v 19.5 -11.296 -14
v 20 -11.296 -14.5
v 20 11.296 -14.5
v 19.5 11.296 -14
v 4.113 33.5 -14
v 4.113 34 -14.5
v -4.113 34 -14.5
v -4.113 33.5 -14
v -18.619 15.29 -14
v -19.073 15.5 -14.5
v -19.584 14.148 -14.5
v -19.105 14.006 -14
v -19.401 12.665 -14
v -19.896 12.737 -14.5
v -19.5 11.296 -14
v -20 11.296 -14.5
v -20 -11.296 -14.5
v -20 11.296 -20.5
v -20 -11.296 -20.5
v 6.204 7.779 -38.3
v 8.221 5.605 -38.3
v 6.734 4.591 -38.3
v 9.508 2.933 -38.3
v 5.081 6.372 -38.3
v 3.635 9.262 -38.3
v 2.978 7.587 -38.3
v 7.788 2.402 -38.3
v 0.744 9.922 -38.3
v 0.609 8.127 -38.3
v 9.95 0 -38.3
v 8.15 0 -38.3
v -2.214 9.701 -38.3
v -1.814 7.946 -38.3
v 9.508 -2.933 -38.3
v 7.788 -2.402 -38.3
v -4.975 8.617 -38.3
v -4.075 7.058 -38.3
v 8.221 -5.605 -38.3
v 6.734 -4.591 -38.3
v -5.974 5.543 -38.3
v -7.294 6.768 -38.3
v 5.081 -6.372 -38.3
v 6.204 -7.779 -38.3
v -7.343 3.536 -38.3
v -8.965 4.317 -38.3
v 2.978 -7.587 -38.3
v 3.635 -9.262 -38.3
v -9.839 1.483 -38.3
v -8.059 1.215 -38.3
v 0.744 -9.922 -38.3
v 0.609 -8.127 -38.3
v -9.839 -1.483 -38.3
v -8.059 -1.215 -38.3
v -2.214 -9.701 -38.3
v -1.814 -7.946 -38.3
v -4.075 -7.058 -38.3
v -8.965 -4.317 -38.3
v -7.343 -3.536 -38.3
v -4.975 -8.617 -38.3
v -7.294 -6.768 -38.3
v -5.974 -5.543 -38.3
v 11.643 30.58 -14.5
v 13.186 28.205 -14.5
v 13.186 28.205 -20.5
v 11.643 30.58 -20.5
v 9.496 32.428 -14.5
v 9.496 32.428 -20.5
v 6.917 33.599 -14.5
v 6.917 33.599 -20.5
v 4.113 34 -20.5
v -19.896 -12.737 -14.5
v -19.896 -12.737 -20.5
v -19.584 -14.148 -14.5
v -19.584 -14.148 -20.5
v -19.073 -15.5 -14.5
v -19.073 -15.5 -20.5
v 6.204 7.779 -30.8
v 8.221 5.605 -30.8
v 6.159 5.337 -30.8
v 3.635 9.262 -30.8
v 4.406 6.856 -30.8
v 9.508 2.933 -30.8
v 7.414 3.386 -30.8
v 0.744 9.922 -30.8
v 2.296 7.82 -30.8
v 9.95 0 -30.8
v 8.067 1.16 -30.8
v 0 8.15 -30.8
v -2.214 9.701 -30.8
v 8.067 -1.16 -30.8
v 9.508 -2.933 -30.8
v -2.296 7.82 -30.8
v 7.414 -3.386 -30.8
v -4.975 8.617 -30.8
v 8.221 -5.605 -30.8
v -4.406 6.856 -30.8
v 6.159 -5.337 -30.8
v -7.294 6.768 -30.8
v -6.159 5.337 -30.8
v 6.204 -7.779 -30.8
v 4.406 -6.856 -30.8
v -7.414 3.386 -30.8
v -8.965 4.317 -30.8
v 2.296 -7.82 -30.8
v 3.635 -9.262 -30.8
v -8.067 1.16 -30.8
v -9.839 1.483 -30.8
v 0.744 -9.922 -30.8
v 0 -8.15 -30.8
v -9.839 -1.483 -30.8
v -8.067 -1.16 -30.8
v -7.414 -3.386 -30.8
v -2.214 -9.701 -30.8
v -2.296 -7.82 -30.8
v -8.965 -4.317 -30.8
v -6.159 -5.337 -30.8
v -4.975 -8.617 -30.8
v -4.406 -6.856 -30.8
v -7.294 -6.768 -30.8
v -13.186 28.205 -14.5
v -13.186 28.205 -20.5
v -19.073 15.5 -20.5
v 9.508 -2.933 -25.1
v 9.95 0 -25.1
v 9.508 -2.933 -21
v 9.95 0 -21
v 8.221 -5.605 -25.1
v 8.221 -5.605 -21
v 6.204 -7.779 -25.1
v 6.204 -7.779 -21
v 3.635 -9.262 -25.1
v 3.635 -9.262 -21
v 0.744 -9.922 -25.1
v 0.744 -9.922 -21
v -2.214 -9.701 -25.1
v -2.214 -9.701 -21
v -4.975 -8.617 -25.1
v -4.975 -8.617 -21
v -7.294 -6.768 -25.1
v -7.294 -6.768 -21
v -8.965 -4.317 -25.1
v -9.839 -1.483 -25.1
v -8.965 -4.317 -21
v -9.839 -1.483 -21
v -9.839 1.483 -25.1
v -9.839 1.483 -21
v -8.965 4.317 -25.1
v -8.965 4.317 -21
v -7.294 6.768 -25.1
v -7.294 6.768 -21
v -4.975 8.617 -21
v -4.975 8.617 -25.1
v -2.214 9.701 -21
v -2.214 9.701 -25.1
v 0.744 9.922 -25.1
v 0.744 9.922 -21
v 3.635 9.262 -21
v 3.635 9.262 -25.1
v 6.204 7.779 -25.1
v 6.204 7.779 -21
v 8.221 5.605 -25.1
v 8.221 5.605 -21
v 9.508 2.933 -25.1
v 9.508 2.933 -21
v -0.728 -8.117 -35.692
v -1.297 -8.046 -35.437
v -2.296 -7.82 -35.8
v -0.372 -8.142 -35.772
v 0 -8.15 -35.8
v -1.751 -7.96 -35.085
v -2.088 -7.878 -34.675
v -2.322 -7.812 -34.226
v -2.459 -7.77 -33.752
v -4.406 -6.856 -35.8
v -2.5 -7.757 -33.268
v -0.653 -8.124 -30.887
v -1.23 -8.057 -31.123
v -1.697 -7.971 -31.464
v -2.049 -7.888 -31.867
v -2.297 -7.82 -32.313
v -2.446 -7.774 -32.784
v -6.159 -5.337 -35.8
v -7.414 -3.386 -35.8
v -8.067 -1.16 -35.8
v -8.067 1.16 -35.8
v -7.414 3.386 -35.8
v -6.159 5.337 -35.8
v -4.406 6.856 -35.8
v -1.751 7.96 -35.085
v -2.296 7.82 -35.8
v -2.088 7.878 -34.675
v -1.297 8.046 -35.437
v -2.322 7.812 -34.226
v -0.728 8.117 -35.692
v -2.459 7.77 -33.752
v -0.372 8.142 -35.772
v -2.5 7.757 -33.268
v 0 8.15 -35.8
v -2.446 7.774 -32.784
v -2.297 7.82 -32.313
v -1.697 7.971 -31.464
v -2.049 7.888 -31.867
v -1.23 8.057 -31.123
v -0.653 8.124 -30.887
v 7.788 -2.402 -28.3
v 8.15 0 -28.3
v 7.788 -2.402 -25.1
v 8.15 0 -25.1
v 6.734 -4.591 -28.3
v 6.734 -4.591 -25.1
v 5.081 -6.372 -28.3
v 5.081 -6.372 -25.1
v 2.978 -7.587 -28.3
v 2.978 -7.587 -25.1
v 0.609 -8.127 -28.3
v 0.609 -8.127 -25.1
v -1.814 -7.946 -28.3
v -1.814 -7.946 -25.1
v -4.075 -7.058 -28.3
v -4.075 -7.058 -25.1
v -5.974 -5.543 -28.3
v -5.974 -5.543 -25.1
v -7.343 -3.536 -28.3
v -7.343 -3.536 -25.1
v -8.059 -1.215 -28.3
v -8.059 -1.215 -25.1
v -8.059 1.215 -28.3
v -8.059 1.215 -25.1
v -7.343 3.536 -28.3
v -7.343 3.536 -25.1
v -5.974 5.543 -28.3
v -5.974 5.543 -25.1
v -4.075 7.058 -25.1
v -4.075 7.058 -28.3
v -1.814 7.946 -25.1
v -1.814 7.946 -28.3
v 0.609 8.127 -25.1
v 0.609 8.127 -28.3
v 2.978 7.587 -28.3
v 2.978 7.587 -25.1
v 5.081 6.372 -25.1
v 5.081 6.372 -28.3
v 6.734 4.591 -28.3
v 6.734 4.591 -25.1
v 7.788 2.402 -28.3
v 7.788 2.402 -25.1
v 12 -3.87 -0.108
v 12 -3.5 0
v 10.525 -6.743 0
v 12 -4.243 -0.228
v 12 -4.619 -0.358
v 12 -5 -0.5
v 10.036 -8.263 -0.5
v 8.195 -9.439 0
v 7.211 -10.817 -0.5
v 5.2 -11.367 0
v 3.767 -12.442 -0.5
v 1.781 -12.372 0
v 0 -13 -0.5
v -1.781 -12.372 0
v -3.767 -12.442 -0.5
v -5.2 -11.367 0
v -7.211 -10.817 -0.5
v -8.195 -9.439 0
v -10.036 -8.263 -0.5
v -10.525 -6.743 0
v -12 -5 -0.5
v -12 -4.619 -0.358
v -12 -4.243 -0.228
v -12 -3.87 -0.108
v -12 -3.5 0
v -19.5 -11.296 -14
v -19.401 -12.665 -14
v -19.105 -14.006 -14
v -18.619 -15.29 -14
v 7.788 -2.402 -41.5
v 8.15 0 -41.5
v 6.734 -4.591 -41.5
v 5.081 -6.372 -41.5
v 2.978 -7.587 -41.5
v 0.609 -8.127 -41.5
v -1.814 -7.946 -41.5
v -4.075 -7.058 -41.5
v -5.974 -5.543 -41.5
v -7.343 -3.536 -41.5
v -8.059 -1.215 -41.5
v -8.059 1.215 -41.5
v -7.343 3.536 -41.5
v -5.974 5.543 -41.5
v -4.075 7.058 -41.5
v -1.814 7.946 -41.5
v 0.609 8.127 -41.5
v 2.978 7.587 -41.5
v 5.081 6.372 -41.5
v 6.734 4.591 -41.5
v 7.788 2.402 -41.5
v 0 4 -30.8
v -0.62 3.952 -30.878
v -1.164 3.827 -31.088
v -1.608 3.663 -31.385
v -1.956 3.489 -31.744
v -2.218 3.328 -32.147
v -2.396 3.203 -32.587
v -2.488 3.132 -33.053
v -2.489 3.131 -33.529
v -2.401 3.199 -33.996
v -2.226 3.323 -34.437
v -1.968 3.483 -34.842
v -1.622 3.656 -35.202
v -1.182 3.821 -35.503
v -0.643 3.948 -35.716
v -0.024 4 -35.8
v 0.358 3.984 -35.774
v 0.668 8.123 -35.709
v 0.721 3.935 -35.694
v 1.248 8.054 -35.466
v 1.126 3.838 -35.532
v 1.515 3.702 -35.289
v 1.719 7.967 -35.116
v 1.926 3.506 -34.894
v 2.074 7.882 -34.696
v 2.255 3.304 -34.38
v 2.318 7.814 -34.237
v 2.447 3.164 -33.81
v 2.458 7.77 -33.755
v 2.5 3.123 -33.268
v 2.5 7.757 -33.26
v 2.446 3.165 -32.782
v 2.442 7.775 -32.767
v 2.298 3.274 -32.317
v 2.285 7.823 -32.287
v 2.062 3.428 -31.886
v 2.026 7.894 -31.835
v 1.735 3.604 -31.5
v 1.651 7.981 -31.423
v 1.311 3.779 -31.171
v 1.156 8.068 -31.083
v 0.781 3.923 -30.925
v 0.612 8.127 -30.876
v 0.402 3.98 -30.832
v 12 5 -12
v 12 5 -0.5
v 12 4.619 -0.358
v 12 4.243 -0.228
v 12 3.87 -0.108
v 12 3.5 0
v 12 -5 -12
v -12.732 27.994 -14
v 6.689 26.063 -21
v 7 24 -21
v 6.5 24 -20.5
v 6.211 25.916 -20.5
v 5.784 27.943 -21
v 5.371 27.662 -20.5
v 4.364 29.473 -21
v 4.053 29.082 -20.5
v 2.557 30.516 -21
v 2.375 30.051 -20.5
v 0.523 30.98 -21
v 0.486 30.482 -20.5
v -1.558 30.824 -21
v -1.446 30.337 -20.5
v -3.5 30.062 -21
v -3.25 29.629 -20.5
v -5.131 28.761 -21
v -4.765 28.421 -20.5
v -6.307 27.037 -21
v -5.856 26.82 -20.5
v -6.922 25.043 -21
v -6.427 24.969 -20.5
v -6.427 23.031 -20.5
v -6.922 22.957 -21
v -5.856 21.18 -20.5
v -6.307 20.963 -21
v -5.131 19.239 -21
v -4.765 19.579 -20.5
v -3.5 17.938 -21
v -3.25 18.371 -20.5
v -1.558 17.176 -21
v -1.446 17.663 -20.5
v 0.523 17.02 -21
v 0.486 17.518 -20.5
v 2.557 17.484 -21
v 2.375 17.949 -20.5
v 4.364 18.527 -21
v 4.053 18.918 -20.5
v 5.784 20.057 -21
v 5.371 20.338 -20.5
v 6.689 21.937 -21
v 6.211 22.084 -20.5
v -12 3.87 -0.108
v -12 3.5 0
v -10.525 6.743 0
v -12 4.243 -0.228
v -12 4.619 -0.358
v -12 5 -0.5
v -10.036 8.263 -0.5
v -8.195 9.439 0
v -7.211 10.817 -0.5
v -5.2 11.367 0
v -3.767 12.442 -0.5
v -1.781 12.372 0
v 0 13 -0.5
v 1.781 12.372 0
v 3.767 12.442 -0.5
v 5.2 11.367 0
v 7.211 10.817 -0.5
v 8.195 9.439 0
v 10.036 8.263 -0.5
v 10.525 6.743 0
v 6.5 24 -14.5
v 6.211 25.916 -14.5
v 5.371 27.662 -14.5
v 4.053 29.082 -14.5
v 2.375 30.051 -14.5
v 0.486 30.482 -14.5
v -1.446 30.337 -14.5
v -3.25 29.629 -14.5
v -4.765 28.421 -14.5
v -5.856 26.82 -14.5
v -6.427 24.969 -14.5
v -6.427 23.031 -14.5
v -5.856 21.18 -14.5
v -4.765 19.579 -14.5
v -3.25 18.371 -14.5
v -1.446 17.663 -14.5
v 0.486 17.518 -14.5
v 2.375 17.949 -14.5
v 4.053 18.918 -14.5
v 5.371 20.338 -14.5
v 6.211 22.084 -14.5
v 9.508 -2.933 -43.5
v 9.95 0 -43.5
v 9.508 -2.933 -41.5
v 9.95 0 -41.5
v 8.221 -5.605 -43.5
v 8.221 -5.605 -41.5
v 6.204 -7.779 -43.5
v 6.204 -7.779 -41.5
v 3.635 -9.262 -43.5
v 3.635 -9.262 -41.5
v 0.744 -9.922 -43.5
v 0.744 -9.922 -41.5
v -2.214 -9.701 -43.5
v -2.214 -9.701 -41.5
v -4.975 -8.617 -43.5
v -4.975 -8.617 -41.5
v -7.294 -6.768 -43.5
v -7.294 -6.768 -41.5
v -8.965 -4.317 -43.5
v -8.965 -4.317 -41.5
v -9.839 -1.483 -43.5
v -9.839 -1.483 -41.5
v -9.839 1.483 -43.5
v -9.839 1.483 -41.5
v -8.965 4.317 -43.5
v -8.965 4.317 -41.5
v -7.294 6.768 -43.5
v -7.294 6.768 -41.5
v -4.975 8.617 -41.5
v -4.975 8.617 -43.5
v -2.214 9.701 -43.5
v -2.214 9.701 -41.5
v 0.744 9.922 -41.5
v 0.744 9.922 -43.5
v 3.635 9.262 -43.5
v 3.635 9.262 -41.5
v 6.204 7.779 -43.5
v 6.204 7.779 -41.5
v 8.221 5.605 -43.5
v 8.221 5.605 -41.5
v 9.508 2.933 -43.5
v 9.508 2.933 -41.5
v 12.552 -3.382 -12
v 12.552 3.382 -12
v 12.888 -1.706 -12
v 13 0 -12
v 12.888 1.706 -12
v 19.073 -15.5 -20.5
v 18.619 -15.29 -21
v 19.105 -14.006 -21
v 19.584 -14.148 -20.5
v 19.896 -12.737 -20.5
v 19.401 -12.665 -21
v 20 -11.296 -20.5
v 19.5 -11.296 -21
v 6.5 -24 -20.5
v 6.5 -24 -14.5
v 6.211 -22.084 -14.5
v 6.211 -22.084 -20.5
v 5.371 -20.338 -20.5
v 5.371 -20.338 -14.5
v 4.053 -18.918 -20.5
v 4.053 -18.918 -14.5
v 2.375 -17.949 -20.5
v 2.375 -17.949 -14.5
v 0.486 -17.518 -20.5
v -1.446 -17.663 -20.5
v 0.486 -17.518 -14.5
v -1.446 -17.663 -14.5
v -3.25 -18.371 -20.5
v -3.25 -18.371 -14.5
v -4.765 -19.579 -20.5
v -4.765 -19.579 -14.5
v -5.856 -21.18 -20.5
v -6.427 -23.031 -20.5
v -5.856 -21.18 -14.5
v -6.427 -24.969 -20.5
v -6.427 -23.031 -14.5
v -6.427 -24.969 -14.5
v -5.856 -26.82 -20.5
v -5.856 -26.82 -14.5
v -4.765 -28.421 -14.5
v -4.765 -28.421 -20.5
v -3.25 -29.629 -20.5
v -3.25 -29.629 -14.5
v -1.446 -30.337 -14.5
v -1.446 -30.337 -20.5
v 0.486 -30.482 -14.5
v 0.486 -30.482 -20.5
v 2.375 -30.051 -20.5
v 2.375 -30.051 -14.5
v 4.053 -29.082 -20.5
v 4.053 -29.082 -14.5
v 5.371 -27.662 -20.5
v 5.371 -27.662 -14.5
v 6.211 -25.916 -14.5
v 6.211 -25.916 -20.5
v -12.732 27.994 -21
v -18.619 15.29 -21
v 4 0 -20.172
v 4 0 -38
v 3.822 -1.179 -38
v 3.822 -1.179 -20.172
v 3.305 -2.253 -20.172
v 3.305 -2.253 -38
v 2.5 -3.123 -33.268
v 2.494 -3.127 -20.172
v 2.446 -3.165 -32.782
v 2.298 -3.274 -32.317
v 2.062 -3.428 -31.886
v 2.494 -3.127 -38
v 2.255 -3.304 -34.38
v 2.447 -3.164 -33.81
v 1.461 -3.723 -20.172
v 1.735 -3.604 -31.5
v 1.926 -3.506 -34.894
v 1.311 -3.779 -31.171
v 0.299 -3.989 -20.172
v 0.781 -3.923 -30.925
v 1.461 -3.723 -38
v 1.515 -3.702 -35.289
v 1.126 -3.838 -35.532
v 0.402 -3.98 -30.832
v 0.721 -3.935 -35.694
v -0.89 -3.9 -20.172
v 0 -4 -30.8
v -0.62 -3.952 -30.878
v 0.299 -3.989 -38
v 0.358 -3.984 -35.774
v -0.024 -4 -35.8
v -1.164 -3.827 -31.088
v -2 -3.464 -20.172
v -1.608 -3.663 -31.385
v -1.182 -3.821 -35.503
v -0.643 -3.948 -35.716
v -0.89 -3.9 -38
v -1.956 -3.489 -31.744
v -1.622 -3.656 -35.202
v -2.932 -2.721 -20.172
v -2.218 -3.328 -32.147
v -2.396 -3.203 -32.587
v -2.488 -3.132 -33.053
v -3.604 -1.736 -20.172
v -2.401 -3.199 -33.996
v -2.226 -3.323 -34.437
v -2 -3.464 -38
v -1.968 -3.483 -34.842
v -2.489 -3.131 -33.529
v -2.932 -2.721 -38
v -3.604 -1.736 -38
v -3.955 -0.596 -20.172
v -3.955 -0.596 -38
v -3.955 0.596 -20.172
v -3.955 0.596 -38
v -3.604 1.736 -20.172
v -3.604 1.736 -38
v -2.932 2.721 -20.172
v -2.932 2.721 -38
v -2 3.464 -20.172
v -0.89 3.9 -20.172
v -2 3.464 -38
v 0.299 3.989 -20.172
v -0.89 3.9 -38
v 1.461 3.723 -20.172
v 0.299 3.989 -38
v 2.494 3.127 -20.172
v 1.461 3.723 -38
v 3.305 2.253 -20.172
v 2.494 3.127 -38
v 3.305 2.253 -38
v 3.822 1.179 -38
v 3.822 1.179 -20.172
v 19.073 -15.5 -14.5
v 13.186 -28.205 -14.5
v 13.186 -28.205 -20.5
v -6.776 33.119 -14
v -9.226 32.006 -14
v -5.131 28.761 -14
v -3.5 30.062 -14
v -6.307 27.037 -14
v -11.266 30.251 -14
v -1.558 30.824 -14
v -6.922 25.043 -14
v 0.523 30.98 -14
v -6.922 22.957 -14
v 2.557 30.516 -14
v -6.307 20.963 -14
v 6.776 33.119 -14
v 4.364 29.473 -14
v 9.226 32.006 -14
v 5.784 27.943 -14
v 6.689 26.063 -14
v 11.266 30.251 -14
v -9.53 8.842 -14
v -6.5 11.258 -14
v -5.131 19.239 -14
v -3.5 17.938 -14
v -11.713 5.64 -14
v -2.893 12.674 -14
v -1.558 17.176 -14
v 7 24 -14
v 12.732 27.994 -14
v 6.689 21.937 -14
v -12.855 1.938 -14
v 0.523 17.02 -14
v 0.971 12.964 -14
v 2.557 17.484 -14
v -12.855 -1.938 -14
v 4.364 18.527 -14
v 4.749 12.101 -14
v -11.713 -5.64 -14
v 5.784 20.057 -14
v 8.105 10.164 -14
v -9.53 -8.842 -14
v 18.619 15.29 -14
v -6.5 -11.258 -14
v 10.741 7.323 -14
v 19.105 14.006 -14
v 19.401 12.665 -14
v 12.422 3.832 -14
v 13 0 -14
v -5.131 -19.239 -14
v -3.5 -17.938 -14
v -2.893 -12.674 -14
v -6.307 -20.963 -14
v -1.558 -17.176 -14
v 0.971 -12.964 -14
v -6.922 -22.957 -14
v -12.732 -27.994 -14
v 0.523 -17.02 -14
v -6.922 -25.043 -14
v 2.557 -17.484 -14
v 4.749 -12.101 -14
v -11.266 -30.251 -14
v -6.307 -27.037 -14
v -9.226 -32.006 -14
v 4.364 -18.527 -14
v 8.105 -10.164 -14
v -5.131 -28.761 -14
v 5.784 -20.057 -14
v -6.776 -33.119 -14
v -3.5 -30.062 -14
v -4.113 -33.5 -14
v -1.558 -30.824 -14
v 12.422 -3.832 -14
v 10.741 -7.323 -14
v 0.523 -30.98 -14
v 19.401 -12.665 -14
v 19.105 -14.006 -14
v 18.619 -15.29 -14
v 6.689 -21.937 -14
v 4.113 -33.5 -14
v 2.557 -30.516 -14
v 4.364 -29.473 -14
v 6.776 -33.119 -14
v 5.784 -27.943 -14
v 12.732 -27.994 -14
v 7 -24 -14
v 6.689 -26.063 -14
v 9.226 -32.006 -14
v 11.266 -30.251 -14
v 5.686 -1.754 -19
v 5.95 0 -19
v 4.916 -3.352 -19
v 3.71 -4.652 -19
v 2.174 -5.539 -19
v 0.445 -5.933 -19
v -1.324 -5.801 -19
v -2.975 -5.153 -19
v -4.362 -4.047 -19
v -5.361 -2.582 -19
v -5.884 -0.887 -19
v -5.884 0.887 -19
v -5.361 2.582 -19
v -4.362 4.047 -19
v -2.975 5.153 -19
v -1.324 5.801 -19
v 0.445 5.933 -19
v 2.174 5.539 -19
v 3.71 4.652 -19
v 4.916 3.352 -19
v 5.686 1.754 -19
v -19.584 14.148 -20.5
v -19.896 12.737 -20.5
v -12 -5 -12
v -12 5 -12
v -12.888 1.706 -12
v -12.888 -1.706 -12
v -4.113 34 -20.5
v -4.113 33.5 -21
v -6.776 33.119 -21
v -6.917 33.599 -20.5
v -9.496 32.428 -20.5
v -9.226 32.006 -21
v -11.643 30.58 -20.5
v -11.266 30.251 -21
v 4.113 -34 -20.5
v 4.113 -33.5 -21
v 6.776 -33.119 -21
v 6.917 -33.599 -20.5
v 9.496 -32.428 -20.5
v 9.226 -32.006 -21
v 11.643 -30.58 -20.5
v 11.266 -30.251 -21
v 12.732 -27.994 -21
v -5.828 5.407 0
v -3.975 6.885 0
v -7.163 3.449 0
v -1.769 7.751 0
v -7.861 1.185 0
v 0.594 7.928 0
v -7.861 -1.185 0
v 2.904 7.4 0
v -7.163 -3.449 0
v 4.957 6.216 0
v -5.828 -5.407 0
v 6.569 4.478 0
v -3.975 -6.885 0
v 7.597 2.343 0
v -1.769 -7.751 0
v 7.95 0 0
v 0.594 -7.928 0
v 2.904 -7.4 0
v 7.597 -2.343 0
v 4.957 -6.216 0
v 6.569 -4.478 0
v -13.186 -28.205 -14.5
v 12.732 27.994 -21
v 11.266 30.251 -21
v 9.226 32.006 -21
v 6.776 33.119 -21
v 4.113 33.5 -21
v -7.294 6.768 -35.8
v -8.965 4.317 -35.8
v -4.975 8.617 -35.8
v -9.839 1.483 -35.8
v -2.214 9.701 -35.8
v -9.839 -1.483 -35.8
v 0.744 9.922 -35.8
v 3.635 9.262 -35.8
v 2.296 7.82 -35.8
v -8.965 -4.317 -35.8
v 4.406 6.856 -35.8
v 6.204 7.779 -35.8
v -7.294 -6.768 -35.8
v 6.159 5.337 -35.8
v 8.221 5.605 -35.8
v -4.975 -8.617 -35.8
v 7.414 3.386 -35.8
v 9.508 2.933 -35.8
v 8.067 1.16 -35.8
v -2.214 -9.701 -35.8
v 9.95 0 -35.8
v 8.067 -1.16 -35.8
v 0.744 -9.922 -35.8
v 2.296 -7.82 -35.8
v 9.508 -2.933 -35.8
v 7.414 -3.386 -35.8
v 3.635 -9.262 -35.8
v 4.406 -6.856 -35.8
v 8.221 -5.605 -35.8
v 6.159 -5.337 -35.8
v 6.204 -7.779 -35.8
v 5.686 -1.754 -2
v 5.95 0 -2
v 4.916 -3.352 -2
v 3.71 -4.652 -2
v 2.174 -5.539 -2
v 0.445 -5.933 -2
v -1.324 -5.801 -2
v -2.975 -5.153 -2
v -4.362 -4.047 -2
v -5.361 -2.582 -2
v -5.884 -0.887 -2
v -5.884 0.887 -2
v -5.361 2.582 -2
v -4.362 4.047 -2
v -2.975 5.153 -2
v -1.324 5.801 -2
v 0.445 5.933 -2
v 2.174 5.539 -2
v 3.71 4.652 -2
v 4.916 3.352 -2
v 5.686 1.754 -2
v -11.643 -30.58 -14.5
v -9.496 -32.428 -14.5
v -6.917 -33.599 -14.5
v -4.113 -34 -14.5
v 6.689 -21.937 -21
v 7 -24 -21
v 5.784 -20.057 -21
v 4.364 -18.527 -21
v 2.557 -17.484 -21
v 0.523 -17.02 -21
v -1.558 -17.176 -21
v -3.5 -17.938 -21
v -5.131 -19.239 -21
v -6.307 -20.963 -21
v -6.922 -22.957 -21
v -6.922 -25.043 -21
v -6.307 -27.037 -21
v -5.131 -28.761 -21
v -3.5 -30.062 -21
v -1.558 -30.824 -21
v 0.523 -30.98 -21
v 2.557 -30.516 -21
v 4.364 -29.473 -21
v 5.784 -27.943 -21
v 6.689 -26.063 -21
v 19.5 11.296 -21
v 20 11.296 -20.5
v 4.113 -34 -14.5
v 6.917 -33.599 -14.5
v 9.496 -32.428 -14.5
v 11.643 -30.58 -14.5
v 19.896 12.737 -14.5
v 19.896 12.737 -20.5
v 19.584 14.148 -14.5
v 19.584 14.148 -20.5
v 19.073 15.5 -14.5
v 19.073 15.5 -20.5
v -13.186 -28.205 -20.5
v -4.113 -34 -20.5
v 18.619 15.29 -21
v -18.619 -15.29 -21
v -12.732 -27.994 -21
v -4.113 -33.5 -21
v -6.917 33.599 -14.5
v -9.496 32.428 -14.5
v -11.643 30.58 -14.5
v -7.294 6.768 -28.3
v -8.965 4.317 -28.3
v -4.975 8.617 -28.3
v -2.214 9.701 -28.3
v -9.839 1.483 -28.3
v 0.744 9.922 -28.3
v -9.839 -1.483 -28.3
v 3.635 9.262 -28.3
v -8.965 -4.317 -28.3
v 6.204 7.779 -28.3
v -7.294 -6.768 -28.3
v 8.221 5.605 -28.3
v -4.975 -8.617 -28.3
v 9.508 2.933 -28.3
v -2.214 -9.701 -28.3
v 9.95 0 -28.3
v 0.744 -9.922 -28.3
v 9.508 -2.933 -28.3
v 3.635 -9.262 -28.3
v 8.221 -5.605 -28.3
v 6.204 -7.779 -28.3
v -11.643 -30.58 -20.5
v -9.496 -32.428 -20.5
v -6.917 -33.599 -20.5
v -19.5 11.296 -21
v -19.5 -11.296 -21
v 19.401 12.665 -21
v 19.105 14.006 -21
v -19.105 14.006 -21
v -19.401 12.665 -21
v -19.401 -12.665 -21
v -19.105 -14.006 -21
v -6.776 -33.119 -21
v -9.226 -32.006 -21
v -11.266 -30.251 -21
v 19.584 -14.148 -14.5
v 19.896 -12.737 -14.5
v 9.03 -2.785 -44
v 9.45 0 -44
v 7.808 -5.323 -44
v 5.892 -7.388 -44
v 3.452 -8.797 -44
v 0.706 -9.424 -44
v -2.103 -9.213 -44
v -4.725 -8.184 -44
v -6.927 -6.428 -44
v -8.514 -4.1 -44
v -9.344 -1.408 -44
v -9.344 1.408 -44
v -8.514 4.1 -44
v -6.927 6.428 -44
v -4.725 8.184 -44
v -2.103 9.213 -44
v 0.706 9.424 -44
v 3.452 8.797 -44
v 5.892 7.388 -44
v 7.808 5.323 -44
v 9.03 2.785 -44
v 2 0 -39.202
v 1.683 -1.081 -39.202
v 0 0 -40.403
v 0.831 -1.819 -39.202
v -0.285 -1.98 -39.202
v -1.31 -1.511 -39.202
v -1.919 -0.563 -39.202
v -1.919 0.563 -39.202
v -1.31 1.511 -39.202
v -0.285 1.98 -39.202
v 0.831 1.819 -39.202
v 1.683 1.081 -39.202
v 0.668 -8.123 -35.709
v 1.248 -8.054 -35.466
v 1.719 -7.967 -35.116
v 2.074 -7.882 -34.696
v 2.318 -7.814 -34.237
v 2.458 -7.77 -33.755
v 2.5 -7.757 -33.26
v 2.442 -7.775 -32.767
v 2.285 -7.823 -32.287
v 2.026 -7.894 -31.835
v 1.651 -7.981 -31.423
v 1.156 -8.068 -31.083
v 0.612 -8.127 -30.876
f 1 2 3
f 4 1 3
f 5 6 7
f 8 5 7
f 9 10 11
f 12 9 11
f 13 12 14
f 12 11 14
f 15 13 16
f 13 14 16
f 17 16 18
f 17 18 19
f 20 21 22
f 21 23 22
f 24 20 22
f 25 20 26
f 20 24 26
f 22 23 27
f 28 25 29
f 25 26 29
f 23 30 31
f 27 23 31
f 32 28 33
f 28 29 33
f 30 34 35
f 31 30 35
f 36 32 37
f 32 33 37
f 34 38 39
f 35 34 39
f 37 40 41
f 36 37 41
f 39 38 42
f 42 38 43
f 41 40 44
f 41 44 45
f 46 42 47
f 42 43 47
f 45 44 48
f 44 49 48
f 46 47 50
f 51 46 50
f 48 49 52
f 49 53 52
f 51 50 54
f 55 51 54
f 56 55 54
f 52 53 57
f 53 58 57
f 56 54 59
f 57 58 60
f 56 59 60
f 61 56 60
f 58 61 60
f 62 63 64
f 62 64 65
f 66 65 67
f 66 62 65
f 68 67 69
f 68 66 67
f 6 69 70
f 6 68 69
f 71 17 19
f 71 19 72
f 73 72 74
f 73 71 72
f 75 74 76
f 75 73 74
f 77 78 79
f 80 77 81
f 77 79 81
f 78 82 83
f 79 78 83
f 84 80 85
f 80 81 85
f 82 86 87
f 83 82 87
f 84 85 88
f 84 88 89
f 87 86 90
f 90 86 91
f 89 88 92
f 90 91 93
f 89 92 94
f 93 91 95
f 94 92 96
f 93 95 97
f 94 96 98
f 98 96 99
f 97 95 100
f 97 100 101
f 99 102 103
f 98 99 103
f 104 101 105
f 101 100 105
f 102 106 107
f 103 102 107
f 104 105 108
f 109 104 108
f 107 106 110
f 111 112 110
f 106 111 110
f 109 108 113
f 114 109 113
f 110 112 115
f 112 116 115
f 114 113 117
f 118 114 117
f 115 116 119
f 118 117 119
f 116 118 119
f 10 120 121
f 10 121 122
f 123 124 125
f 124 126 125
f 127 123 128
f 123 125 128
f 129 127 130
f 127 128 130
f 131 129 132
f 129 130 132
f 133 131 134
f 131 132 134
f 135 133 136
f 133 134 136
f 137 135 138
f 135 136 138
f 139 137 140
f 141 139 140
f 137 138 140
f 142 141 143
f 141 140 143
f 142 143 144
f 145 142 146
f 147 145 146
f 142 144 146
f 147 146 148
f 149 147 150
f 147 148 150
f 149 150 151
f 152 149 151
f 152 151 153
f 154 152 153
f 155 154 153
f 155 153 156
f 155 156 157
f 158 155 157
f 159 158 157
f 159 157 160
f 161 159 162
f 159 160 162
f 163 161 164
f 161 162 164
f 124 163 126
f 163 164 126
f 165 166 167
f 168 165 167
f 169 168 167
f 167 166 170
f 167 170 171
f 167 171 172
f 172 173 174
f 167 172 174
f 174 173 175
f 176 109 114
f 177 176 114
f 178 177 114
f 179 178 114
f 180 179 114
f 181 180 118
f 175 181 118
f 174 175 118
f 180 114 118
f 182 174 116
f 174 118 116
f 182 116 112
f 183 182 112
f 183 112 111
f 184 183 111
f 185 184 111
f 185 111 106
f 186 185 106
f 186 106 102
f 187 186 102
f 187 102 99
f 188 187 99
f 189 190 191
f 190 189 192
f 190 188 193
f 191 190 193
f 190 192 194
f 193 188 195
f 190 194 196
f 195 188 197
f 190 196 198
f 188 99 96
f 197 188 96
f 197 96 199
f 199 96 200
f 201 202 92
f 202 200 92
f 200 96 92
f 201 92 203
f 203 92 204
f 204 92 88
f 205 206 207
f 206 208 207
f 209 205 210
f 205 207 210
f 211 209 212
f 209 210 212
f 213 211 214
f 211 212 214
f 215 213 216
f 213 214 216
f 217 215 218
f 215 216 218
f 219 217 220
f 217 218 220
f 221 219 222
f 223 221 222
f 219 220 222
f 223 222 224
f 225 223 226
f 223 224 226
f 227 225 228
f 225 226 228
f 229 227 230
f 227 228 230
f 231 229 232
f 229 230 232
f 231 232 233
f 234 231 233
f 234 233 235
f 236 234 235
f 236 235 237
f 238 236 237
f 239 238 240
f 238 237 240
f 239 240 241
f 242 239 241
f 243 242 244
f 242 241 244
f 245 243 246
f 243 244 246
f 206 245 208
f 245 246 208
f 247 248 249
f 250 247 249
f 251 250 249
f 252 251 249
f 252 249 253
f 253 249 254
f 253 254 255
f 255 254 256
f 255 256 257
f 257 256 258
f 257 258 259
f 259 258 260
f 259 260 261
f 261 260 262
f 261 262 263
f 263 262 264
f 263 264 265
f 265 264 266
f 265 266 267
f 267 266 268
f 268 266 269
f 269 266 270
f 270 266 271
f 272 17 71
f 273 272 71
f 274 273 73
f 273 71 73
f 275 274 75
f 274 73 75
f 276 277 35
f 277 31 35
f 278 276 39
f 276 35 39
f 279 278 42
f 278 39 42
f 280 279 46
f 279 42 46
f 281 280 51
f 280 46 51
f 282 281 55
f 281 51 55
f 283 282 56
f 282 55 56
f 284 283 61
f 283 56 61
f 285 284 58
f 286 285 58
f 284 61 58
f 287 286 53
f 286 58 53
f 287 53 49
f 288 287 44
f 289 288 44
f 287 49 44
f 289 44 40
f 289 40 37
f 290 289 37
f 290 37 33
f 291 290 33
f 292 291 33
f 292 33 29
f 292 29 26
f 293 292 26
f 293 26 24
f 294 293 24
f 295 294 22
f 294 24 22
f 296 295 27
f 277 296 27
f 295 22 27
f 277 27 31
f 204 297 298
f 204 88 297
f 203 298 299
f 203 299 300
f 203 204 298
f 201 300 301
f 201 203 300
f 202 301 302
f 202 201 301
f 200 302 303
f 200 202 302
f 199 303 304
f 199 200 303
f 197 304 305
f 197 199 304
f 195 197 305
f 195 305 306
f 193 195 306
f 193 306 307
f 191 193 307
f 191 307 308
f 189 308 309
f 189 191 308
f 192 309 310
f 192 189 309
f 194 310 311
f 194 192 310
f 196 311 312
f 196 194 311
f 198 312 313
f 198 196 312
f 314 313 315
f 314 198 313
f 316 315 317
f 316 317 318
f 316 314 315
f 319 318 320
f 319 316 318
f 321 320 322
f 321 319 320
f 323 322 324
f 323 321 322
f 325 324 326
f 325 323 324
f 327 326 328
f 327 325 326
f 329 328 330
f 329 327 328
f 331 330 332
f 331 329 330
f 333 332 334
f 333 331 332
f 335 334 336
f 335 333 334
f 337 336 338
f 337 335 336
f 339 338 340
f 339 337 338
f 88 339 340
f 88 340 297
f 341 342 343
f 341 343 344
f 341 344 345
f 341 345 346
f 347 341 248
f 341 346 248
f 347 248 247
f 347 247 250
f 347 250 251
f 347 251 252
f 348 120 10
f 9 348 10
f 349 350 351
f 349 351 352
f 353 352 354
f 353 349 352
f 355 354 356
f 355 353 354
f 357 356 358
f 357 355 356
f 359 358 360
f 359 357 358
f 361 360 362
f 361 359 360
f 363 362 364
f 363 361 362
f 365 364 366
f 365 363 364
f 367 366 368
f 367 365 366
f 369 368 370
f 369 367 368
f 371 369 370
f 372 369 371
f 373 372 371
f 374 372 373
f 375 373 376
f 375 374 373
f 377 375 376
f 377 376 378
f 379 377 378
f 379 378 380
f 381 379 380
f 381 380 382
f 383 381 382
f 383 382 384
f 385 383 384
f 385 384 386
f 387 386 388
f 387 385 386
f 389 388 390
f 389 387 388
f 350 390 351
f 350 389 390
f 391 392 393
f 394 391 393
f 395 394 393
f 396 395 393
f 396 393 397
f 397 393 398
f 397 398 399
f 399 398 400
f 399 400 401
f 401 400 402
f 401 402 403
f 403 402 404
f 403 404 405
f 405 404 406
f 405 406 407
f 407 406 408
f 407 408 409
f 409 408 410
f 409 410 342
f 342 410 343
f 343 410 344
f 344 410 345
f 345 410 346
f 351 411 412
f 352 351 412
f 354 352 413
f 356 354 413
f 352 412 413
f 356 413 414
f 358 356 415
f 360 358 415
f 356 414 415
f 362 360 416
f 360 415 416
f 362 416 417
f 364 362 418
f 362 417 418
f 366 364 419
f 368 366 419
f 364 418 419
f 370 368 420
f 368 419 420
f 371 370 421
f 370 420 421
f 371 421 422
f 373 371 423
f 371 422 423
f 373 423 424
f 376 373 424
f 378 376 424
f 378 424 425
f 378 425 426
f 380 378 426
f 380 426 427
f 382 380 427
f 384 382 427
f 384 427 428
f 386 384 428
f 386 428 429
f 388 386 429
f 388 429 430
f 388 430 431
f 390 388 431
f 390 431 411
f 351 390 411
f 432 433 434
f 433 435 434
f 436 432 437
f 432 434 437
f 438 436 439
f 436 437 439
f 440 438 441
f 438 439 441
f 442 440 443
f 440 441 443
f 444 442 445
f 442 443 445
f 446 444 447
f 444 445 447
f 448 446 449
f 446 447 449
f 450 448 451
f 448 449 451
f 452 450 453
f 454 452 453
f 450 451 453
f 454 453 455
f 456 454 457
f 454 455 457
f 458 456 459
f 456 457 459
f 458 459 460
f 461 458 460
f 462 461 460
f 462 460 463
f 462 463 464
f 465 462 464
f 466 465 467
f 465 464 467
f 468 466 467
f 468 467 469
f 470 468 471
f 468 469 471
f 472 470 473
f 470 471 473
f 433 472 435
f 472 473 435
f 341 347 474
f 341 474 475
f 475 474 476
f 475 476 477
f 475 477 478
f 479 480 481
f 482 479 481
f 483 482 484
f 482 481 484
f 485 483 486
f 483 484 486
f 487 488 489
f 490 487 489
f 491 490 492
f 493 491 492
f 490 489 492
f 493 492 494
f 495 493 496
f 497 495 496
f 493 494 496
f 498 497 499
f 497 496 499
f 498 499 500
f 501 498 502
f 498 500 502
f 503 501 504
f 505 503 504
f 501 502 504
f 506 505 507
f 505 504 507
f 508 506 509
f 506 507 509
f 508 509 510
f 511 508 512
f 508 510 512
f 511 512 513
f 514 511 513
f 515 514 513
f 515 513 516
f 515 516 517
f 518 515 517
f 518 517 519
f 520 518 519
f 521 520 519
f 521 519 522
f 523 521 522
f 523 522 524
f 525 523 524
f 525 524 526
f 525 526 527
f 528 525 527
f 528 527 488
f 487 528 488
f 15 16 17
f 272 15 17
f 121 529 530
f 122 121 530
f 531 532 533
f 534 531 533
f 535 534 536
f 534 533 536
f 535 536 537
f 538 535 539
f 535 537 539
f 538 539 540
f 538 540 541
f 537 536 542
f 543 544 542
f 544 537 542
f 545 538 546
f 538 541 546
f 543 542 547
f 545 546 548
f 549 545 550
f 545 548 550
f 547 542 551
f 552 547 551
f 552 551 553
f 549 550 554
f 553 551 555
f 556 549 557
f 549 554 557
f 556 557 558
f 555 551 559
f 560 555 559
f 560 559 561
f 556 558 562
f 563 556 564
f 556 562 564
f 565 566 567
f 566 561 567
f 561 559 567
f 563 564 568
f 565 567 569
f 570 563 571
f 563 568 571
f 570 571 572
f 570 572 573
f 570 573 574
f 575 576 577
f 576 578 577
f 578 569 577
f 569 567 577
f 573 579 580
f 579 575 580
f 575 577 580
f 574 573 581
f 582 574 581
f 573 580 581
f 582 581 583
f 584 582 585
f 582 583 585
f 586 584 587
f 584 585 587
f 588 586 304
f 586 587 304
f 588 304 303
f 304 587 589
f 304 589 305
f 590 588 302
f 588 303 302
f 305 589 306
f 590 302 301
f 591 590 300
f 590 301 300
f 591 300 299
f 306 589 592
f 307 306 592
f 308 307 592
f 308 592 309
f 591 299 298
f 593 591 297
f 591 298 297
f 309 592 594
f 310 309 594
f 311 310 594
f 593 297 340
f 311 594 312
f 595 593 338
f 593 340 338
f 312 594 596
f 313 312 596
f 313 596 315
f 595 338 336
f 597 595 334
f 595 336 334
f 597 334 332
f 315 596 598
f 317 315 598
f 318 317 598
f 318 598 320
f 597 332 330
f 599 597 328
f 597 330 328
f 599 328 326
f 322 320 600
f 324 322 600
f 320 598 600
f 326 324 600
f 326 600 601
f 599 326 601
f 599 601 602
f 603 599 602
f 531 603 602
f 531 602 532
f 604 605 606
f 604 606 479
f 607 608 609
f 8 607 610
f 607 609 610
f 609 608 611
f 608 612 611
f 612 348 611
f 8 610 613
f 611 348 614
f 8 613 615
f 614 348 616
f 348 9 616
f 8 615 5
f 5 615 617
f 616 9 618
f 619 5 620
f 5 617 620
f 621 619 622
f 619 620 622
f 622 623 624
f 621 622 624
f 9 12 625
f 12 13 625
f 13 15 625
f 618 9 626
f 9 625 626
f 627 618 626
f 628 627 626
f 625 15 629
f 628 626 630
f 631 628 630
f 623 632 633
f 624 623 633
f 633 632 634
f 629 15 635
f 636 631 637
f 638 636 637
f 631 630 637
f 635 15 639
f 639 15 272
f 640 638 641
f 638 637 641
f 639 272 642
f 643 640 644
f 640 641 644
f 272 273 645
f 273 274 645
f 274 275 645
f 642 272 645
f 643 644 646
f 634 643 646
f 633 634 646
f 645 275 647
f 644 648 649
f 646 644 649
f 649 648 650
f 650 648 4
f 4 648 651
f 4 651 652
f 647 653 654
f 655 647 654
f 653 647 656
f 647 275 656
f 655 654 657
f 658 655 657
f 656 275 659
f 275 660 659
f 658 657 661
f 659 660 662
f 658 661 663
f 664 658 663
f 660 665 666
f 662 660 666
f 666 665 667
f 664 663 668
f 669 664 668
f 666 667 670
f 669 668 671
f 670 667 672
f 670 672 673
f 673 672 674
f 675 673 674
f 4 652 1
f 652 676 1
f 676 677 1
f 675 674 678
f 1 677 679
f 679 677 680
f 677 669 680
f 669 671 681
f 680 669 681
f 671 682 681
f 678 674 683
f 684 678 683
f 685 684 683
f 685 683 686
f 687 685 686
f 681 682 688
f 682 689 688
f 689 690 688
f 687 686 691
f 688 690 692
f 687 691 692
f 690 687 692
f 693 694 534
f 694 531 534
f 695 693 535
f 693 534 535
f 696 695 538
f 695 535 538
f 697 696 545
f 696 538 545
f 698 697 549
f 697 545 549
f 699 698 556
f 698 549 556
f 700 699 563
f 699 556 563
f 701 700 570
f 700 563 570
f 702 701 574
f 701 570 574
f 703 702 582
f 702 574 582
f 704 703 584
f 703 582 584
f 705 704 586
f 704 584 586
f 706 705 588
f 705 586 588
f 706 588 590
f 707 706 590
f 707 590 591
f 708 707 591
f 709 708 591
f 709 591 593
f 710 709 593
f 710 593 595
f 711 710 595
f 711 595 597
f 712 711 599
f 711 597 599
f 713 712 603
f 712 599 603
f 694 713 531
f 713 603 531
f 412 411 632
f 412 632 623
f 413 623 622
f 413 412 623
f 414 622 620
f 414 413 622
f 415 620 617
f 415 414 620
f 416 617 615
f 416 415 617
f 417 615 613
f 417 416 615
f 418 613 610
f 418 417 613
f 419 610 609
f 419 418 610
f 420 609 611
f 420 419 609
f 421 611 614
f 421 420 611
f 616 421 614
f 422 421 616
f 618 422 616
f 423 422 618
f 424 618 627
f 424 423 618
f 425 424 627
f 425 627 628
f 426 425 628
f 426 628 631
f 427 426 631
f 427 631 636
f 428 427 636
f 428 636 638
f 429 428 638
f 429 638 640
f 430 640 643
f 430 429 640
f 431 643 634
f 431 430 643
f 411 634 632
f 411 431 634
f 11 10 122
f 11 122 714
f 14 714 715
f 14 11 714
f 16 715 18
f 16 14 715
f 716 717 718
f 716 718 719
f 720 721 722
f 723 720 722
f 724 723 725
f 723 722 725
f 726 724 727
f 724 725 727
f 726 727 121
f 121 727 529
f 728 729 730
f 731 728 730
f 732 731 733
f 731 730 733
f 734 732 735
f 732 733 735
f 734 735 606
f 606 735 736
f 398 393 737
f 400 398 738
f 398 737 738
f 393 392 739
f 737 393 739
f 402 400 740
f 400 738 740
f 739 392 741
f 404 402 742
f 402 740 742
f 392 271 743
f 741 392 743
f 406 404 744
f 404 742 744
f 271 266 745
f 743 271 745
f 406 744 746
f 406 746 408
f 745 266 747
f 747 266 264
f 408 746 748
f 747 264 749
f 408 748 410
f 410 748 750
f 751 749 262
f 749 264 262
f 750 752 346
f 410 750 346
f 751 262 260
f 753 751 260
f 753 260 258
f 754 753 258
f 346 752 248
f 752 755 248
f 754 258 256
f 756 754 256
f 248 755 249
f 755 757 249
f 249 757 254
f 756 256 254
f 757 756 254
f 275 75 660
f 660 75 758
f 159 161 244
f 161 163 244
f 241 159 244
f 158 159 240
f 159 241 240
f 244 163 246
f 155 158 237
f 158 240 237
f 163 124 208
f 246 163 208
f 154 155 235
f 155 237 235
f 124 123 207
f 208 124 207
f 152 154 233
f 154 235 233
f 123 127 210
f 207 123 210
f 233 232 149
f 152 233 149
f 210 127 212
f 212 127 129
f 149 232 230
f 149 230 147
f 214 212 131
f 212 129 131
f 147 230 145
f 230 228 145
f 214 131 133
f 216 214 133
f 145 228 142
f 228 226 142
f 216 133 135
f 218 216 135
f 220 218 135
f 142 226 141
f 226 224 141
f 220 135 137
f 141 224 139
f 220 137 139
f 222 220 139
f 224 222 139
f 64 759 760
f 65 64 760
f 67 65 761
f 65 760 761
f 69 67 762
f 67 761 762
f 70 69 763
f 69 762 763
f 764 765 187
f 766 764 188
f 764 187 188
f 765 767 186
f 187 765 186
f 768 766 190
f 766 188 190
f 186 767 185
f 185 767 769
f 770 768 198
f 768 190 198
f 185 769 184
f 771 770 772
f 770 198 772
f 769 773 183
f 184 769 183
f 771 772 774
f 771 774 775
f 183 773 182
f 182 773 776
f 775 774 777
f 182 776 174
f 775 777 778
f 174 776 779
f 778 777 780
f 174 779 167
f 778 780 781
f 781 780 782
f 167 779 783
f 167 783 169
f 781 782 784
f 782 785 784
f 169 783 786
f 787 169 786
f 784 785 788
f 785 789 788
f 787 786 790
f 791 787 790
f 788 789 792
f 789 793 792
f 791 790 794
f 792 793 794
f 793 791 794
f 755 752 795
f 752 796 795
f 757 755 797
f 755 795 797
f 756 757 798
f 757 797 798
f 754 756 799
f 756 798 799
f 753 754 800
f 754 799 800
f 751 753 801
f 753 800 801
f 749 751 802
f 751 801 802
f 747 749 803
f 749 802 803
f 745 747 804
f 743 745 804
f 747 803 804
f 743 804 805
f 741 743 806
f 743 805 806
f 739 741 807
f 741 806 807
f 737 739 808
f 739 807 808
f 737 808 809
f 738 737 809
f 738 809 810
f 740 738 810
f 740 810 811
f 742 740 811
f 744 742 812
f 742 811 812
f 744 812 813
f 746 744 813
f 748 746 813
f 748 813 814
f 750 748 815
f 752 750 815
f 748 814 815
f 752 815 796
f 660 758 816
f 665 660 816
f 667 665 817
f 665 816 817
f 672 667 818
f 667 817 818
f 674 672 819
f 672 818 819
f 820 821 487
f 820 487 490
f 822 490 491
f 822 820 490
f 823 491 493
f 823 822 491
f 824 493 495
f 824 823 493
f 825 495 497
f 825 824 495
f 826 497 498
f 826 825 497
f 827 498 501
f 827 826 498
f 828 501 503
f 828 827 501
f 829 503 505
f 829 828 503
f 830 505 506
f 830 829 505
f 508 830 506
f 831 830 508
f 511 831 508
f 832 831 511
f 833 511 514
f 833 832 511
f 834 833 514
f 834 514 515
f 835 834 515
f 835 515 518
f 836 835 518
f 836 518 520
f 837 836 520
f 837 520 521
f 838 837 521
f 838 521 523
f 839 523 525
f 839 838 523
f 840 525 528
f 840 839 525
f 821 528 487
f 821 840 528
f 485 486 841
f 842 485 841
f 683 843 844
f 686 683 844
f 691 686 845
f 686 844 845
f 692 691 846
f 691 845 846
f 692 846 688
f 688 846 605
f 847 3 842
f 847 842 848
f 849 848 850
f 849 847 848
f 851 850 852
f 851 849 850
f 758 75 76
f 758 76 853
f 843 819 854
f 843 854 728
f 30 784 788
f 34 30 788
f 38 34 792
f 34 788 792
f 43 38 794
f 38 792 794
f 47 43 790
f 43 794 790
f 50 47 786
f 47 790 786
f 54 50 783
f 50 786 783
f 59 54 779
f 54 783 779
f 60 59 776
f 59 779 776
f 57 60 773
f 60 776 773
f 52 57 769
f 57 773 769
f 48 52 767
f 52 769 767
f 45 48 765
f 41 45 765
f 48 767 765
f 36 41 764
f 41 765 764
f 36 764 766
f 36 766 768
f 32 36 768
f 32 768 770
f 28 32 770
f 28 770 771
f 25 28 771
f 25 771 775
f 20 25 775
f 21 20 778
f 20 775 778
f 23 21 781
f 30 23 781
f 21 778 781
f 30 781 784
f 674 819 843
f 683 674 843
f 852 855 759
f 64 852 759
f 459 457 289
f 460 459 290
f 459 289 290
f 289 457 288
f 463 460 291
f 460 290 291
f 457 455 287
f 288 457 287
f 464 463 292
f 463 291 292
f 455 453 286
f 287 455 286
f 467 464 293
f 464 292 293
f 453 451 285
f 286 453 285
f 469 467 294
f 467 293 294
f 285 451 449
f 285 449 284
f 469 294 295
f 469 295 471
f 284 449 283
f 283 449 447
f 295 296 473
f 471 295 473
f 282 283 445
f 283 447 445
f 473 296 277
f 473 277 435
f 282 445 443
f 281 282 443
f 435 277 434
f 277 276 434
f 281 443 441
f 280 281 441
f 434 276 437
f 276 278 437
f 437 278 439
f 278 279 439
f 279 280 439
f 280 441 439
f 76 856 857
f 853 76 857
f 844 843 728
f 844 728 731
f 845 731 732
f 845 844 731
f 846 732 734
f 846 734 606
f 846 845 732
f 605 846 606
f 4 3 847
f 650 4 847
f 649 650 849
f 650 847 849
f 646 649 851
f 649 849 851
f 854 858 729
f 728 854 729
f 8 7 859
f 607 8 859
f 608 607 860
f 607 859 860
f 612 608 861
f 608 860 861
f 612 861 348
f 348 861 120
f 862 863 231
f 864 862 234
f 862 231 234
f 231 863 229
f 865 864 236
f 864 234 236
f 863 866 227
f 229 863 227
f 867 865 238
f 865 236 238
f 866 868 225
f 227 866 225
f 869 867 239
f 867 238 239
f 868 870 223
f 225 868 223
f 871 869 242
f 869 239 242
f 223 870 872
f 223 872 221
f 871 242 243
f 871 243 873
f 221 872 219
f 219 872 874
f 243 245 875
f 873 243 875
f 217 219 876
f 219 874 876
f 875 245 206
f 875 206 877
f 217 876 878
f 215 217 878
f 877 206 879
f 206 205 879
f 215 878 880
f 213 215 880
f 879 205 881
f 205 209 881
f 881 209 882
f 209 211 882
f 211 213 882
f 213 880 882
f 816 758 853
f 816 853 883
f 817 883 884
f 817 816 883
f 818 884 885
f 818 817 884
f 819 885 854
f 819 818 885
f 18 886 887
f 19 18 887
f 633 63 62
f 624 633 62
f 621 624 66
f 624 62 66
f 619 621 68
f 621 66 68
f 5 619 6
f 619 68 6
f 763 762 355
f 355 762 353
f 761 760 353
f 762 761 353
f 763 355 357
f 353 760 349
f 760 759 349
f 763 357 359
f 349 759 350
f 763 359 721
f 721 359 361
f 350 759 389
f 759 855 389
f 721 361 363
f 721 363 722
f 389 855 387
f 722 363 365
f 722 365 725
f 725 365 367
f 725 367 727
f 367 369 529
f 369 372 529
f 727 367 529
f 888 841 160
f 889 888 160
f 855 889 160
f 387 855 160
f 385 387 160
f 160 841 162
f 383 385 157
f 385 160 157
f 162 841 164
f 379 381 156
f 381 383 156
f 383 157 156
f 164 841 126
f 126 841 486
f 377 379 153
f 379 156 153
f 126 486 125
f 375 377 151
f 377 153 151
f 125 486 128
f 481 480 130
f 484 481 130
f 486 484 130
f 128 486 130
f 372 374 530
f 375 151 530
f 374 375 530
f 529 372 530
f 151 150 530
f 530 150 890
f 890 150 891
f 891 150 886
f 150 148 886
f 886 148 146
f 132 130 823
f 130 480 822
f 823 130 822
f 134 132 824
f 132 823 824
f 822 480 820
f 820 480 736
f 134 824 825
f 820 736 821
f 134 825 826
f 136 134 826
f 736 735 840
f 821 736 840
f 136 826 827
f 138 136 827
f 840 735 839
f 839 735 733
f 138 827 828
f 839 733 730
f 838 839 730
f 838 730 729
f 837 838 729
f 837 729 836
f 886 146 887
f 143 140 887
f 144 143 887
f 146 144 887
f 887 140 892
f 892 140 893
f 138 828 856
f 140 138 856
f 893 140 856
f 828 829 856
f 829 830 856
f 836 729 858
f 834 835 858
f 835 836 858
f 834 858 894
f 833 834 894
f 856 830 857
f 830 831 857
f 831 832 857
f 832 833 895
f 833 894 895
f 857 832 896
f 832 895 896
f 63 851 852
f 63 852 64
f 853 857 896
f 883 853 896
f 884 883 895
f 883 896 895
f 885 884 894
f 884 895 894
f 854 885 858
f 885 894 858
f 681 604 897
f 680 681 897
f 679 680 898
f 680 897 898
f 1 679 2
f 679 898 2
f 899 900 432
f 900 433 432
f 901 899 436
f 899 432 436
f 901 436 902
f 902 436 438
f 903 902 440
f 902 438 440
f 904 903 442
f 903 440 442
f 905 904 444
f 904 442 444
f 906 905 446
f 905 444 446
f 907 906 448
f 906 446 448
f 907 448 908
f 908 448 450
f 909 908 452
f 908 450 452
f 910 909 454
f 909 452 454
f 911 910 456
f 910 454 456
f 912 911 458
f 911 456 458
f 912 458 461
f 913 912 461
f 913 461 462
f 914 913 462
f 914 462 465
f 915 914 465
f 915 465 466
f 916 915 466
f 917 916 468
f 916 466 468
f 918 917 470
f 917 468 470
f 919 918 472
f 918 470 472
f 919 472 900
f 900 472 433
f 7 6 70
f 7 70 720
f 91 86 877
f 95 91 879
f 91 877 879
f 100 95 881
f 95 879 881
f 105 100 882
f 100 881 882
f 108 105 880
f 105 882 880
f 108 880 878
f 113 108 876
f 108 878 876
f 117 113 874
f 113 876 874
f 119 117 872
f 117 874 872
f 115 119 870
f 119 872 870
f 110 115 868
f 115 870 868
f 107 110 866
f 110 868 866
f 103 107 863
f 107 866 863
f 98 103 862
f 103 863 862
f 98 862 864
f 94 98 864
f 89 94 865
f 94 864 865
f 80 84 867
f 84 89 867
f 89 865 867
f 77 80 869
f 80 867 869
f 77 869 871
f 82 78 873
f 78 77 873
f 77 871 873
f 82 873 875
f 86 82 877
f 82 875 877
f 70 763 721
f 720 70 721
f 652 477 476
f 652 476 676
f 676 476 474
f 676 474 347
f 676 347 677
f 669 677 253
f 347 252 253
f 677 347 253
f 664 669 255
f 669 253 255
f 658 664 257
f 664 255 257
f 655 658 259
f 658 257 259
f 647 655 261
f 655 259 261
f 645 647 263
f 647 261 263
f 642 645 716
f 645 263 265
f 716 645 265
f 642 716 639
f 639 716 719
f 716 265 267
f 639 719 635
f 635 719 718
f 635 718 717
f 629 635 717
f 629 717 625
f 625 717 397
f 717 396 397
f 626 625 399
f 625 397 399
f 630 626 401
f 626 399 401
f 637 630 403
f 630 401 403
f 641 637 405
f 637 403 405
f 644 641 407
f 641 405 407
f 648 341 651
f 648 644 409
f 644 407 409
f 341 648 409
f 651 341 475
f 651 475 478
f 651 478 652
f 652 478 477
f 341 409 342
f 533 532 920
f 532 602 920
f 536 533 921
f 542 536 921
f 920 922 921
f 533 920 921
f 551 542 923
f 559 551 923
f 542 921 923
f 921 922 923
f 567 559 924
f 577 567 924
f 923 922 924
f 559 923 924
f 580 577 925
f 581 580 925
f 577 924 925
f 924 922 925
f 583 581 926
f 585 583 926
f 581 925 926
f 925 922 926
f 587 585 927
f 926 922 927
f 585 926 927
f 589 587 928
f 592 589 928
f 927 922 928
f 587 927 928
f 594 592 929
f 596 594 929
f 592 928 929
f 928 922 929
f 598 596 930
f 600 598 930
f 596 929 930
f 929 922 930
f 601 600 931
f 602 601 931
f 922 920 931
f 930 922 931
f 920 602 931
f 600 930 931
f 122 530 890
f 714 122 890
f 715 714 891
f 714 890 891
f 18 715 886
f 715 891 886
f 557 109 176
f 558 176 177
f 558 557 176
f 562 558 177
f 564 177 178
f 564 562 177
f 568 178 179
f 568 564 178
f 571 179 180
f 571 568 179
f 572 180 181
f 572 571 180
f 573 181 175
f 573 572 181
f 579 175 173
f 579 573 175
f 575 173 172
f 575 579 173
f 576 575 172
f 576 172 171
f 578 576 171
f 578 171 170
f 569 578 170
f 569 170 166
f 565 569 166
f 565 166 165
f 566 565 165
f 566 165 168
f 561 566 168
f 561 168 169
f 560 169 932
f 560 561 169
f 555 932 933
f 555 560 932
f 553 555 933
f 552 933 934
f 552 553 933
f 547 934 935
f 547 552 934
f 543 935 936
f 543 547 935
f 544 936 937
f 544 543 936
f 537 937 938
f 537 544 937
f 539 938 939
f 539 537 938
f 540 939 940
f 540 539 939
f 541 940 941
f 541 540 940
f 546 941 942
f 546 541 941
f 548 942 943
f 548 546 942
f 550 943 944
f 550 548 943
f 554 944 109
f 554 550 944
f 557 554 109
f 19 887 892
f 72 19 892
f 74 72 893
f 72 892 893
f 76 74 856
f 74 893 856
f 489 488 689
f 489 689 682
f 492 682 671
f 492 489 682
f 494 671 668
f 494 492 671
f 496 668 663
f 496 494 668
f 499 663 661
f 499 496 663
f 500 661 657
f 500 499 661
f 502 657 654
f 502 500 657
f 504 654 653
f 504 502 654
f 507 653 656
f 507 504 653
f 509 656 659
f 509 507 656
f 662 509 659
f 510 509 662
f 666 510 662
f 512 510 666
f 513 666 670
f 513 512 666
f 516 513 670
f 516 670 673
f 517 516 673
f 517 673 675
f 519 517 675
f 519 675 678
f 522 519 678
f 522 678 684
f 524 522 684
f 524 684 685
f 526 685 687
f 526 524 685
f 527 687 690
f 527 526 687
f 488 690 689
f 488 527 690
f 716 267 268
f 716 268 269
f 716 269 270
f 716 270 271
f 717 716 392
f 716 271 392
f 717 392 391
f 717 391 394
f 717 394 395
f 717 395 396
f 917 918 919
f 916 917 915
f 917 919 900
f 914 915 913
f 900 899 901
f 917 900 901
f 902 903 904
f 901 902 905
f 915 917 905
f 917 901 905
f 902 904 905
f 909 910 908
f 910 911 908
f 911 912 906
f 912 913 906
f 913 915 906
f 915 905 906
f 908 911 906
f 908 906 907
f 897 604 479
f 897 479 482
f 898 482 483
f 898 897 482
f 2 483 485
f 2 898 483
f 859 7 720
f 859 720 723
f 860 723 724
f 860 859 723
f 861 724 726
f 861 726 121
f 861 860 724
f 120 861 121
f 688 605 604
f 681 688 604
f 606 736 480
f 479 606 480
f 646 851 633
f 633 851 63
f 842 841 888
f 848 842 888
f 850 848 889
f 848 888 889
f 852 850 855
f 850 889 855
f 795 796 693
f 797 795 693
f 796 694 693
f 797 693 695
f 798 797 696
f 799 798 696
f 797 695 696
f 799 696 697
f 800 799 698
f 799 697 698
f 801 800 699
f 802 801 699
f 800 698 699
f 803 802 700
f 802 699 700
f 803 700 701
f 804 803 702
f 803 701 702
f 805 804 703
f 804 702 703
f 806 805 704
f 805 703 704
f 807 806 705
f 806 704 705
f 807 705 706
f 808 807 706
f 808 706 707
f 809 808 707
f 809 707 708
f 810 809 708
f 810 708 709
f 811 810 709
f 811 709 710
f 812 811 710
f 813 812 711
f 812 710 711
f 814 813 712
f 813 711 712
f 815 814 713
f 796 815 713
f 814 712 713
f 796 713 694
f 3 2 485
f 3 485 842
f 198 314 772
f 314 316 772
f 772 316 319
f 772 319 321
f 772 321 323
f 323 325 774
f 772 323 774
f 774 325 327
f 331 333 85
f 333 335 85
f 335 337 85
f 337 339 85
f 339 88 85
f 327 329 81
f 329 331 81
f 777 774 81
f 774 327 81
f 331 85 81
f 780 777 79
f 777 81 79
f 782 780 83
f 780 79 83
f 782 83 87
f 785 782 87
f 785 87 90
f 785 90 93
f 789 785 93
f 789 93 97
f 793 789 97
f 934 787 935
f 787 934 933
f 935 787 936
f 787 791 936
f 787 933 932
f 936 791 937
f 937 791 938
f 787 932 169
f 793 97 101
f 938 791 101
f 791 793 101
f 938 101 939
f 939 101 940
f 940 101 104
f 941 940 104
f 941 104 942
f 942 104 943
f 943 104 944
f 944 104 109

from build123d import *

# Parameters (mm, degrees)
SKETCH3_OUTSIDE_W  = 93.666
SKETCH3_OUTSIDE_H  = 93.666
SKETCH3_OUTSIDE_R  = 6.5
CUT_EXTRUDE1_DEPTH = 21
SKETCH4_W          = 2.5
SKETCH4_H          = 24.819260196
SKETCH7_W          = 2.358889098
SKETCH7_H          = 15
CUT_EXTRUDE2_DEPTH = 12
CIRPATTERN1_COUNT  = 2
CIRPATTERN1_ANGLE  = 180
CHAMFER1_SIZE      = 0.5


with BuildPart() as part:
    # Sketch1 → Revolve1 (revolve)
    with BuildSketch(Plane(origin=(0, 0, 0), x_dir=(0, 0, -1), z_dir=(1, 0, 0)), mode=Mode.PRIVATE) as revolve1_sk:
        Polygon((14, 13), (0.5, 13), (0, 12.5), (0, 7.95), (2, 5.95), (19, 5.95), (20.171678207, 4), (38, 4), (40.403442476, 0), (44, 0), (44, 9.45), (43.5, 9.95), (41.5, 9.95), (41.5, 8.15), (38.3, 8.15), (38.3, 9.95), (35.8, 9.95), (35.8, 8.15), (30.8, 8.15), (30.8, 9.95), (28.3, 9.95), (28.3, 8.15), (25.1, 8.15), (25.1, 9.95), (21, 9.95), (21, 35), (14, 35), align=None)
    revolve(revolve1_sk.sketch.rotate(Axis((0, 0, 0), (0, 0, -1)), 90), axis=Axis((0, 0, 0), (0, 0, -1)))

    # Sketch3 outside → Cut-Extrude1 (cut)
    # profile 1 of 3: a face of its own
    with BuildSketch(Plane.XY):
        Rectangle(SKETCH3_OUTSIDE_W, SKETCH3_OUTSIDE_H)
        with BuildLine():
            Line((-20, 11.295529415), (-20, -11.295529415))
            ThreePointArc((-20, -11.295529415), (-19.765527652, -13.448311261), (-19.073106065, -15.500139543))
            Line((-19.073106065, -15.500139543), (-13.185668477, -28.204610128))
            ThreePointArc((-13.185668477, -28.204610128), (-9.495586596, -32.427517466), (-4.112562412, -34))
            Line((-4.112562412, -34), (4.112562412, -34))
            ThreePointArc((4.112562412, -34), (9.495586596, -32.427517466), (13.185668477, -28.204610128))
            Line((13.185668477, -28.204610128), (19.073106065, -15.500139543))
            ThreePointArc((19.073106065, -15.500139543), (19.765527652, -13.448311261), (20, -11.295529415))
            Line((20, -11.295529415), (20, 11.295529415))
            ThreePointArc((20, 11.295529415), (19.765527652, 13.448311261), (19.073106065, 15.500139543))
            Line((19.073106065, 15.500139543), (13.185668477, 28.204610128))
            ThreePointArc((13.185668477, 28.204610128), (9.495586596, 32.427517466), (4.112562412, 34))
            Line((4.112562412, 34), (-4.112562412, 34))
            ThreePointArc((-4.112562412, 34), (-9.495586596, 32.427517466), (-13.185668477, 28.204610128))
            Line((-13.185668477, 28.204610128), (-19.073106065, 15.500139543))
            ThreePointArc((-19.073106065, 15.500139543), (-19.765527652, 13.448311261), (-20, 11.295529415))
        make_face(mode=Mode.SUBTRACT)
    # profile 2 of 3: a face of its own
    with BuildSketch(Plane.XY):
        with Locations((0, 24)):
            Circle(SKETCH3_OUTSIDE_R)
    # profile 3 of 3: a face of its own
    with BuildSketch(Plane.XY):
        with Locations((0, -24)):
            Circle(SKETCH3_OUTSIDE_R)
    extrude(amount=-CUT_EXTRUDE1_DEPTH, mode=Mode.SUBTRACT)

    # Sketch4 → Cut-Revolve1 (revolve, cut)
    with BuildSketch(Plane(origin=(0, 0, 0), x_dir=(0, 0, -1), z_dir=(1, 0, 0)), mode=Mode.PRIVATE) as cut_revolve1_sk:
        with Locations((34.55, 0)):
            Rectangle(SKETCH4_W, SKETCH4_H)
    revolve(cut_revolve1_sk.sketch.rotate(Axis((0, 12.409630098, -33.3), (0, -1, 0)), 180), axis=Axis((0, 12.409630098, -33.3), (0, -1, 0)), mode=Mode.SUBTRACT)

    # Sketch7 → Cut-Extrude2 (cut)
    with BuildSketch(Plane.XY):
        with Locations((-13.179444549, -0.815585695)):
            Rectangle(SKETCH7_W, SKETCH7_H)
    cut_extrude2 = extrude(amount=-CUT_EXTRUDE2_DEPTH, mode=Mode.SUBTRACT)

    # CirPattern1: Cut-Extrude2 ×2 about axis
    cirpattern1_axis = Axis((0, 0, 0), (0, 0, 1))
    for i in range(1, CIRPATTERN1_COUNT):
        add(cut_extrude2.rotate(cirpattern1_axis, i * CIRPATTERN1_ANGLE / (CIRPATTERN1_COUNT - 1)), mode=Mode.SUBTRACT)

    # Chamfer1
    chamfer1_edges = [part.edges().sort_by_distance(p)[0] for p in [
        (-6.5, 24, -21),
        (-6.5, 24, -14),
        (-6.5, -24, -21),
        (-6.5, -24, -14),
        (0, 34, -21),
        (-9.495586596, 32.427517466, -21),
        (-16.129387271, 21.852374836, -21),
        (-19.765527652, 13.448311261, -21),
        (-20, 0, -21),
        (-19.765527652, -13.448311261, -21),
        (-16.129387271, -21.852374836, -21),
        (-9.495586596, -32.427517466, -21),
        (0, -34, -21),
        (9.495586596, -32.427517466, -21),
        (16.129387271, -21.852374836, -21),
        (19.765527652, -13.448311261, -21),
        (20, 0, -21),
        (19.765527652, 13.448311261, -21),
        (16.129387271, 21.852374836, -21),
        (9.495586596, 32.427517466, -21),
        (-9.495586596, 32.427517466, -14),
        (0, 34, -14),
        (9.495586596, 32.427517466, -14),
        (16.129387271, 21.852374836, -14),
        (19.765527652, 13.448311261, -14),
        (20, 0, -14),
        (19.765527652, -13.448311261, -14),
        (16.129387271, -21.852374836, -14),
        (9.495586596, -32.427517466, -14),
        (0, -34, -14),
        (-9.495586596, -32.427517466, -14),
        (-16.129387271, -21.852374836, -14),
        (-19.765527652, -13.448311261, -14),
        (-20, 0, -14),
        (-19.765527652, 13.448311261, -14),
        (-16.129387271, 21.852374836, -14),
    ]]
    chamfer(chamfer1_edges, length=CHAMFER1_SIZE)


solid = part.part
